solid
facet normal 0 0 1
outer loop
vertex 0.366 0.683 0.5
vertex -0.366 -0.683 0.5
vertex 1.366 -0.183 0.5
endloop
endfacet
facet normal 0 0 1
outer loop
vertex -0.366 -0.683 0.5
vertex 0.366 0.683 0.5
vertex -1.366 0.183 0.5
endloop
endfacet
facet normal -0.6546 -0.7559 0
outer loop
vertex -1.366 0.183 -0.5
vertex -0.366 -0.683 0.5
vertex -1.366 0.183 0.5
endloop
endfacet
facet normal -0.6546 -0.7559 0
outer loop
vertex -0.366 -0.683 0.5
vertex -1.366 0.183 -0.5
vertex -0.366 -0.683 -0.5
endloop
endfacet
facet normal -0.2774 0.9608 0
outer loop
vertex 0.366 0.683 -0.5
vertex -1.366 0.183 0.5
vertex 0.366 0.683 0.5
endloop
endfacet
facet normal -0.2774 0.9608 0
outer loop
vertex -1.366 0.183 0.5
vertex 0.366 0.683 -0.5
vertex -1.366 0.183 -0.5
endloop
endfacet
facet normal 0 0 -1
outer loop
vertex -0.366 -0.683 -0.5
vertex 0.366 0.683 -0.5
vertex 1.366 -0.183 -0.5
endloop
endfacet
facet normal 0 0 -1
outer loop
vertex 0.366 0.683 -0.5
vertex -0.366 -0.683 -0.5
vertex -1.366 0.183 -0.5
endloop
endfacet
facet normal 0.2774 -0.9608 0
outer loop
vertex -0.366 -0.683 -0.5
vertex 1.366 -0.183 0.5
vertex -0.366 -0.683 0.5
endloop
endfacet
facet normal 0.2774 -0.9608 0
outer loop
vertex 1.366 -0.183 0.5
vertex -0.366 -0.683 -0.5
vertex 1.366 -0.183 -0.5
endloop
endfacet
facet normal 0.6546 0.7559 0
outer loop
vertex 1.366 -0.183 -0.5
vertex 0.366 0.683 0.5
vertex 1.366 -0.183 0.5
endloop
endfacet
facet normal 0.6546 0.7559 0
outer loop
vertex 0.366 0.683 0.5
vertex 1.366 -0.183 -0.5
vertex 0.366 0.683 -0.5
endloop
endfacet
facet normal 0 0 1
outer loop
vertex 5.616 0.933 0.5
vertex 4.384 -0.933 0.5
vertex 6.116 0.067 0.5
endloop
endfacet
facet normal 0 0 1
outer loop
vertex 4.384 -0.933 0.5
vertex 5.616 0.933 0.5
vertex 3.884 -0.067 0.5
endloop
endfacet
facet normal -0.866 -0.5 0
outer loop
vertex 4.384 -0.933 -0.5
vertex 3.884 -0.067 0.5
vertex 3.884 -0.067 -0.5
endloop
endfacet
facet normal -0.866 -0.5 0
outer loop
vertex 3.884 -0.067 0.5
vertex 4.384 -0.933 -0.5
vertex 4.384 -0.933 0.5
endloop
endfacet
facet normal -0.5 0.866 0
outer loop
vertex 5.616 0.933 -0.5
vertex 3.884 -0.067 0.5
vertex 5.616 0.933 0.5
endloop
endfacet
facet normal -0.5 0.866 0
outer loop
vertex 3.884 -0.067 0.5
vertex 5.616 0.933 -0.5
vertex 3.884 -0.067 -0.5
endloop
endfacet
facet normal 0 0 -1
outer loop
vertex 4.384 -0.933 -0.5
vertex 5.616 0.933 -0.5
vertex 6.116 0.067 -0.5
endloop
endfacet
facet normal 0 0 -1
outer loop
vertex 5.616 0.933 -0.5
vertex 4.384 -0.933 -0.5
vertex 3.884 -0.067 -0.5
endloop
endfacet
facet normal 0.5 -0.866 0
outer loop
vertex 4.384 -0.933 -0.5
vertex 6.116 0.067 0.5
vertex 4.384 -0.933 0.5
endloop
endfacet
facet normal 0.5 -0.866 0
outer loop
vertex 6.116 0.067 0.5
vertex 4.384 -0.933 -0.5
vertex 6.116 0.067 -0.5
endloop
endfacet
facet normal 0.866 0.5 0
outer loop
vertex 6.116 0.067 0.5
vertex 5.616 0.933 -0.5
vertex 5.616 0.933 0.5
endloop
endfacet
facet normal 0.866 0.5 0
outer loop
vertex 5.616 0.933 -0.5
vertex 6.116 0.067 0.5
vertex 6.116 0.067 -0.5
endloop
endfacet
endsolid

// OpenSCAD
//------------------------------------------------------------------------------------------
// THIS CODE WAS GENERATED WITH GRAPHSCAD
//------------------------------------------------------------------------------------------
// E:/workspace/graphscad/graphscadfiles/objectvsworldscale.scad
//------------------------------------------------------------------------------------------
// Graphscad is a graphical nodal editor to create .SCAD files
//
// More info here : http://graphscad.free.fr
//
// Scad Files created with Graphscad can be edited by graphscad
// Scad Files created with Graphscad can be read by Openscad
//
//------------------------------------------------------------------------------------------
module objectvsworldscale()
{
 function node_cube_matrix(i=0,j=0,k=0,l=0,m=0,n=0) = translate([0.0,0,0]);
 module node_cube(i=0,j=0,k=0,l=0,m=0,n=0)
 {
  translate([0.0,0,0])cube([1,1,1],center=true);
 }
 function node_rotate_matrix(i=0,j=0,k=0,l=0,m=0,n=0) = rotate([0,0,30])*node_cube_matrix(i=i,j=j,k=k,l=l,m=m,n=n);
 module node_rotate(i=0,j=0,k=0,l=0,m=0,n=0)
 {
  rotate([0,0,30])node_cube(i,j,k,l,m,n);
 }
 function node_scale_matrix(i=0,j=0,k=0,l=0,m=0,n=0) = scale([2,1,1])*node_rotate_matrix(i=i,j=j,k=k,l=l,m=m,n=n);
 module node_scale(i=0,j=0,k=0,l=0,m=0,n=0)
 {
  scale([2,1,1])node_rotate(i,j,k,l,m,n);
 }
 function node_scale0_matrix(i=0,j=0,k=0,l=0,m=0,n=0) = node_rotate_matrix(i=i,j=j,k=k,l=l,m=m,n=n)*scale([2,1,1]);
 module node_scale0(i=0,j=0,k=0,l=0,m=0,n=0)
 {
  multmatrix(m=node_rotate_matrix(i=i,j=j,k=k,l=l,m=m,n=n)*scale([2,1,1])*inv4x4(node_rotate_matrix(i=i,j=j,k=k,l=l,m=m,n=n)))node_rotate(i,j,k,l,m,n);
 }
 function node_translate_matrix(i=0,j=0,k=0,l=0,m=0,n=0) = translate([5,0,0])*node_scale0_matrix(i=i,j=j,k=k,l=l,m=m,n=n);
 module node_translate(i=0,j=0,k=0,l=0,m=0,n=0)
 {
  translate([5,0,0])node_scale0(i,j,k,l,m,n);
 }
 node_scale();
 node_translate();
 /*--------------------------------------------------------------------------------------------------------
  Graphscad Utils functions
  This code is Used By Graphscad Nodal Editor to generate SCAD files
 --------------------------------------------------------------------------------------------------------*/
 function det4x4(a) =
 a[0][0]*a[1][1]*a[2][2]*a[3][3] + a[0][0]*a[1][2]*a[2][3]*a[3][1] + a[0][0]*a[1][3]*a[2][1]*a[3][2]
 + a[0][1]*a[1][0]*a[2][3]*a[3][2] + a[0][1]*a[1][2]*a[2][0]*a[3][3] + a[0][1]*a[1][3]*a[2][2]*a[3][0]
 + a[0][2]*a[1][0]*a[2][1]*a[3][3] + a[0][2]*a[1][1]*a[2][3]*a[3][0] + a[0][2]*a[1][3]*a[2][0]*a[3][1]
 + a[0][3]*a[1][0]*a[2][2]*a[3][1] + a[0][3]*a[1][1]*a[2][0]*a[3][2] + a[0][3]*a[1][2]*a[2][1]*a[3][0]
 - a[0][0]*a[1][1]*a[2][3]*a[3][2] - a[0][0]*a[1][2]*a[2][1]*a[3][3] - a[0][0]*a[1][3]*a[2][2]*a[3][1]
 - a[0][1]*a[1][0]*a[2][2]*a[3][3] - a[0][1]*a[1][2]*a[2][3]*a[3][0] - a[0][1]*a[1][3]*a[2][0]*a[3][2]
 - a[0][2]*a[1][0]*a[2][3]*a[3][1] - a[0][2]*a[1][1]*a[2][0]*a[3][3] - a[0][2]*a[1][3]*a[2][1]*a[3][0]
 - a[0][3]*a[1][0]*a[2][1]*a[3][2] - a[0][3]*a[1][1]*a[2][2]*a[3][0] - a[0][3]*a[1][2]*a[2][0]*a[3][1];
 function invb00(a) = a[1][1]*a[2][2]*a[3][3] + a[1][2]*a[2][3]*a[3][1] + a[1][3]*a[2][1]*a[3][2] - a[1][1]*a[2][3]*a[3][2] - a[1][2]*a[2][1]*a[3][3] - a[1][3]*a[2][2]*a[3][1];
 function invb01(a) = a[0][1]*a[2][3]*a[3][2] + a[0][2]*a[2][1]*a[3][3] + a[0][3]*a[2][2]*a[3][1] - a[0][1]*a[2][2]*a[3][3] - a[0][2]*a[2][3]*a[3][1] - a[0][3]*a[2][1]*a[3][2];
 function invb02(a) = a[0][1]*a[1][2]*a[3][3] + a[0][2]*a[1][3]*a[3][1] + a[0][3]*a[1][1]*a[3][2] - a[0][1]*a[1][3]*a[3][2] - a[0][2]*a[1][1]*a[3][3] - a[0][3]*a[1][2]*a[3][1];
 function invb03(a) = a[0][1]*a[1][3]*a[2][2] + a[0][2]*a[1][1]*a[2][3] + a[0][3]*a[1][2]*a[2][1] - a[0][1]*a[1][2]*a[2][3] - a[0][2]*a[1][3]*a[2][1] - a[0][3]*a[1][1]*a[2][2];
 function invb10(a) = a[1][0]*a[2][3]*a[3][2] + a[1][2]*a[2][0]*a[3][3] + a[1][3]*a[2][2]*a[3][0] - a[1][0]*a[2][2]*a[3][3] - a[1][2]*a[2][3]*a[3][0] - a[1][3]*a[2][0]*a[3][2];
 function invb11(a) = a[0][0]*a[2][2]*a[3][3] + a[0][2]*a[2][3]*a[3][0] + a[0][3]*a[2][0]*a[3][2] - a[0][0]*a[2][3]*a[3][2] - a[0][2]*a[2][0]*a[3][3] - a[0][3]*a[2][2]*a[3][0];
 function invb12(a) = a[0][0]*a[1][3]*a[3][2] + a[0][2]*a[1][0]*a[3][3] + a[0][3]*a[1][2]*a[3][0] - a[0][0]*a[1][2]*a[3][3] - a[0][2]*a[1][3]*a[3][0] - a[0][3]*a[1][0]*a[3][2];
 function invb13(a) = a[0][0]*a[1][2]*a[2][3] + a[0][2]*a[1][3]*a[2][0] + a[0][3]*a[1][0]*a[2][2] - a[0][0]*a[1][3]*a[2][2] - a[0][2]*a[1][0]*a[2][3] - a[0][3]*a[1][2]*a[2][0];
 function invb20(a) = a[1][0]*a[2][1]*a[3][3] + a[1][1]*a[2][3]*a[3][0] + a[1][3]*a[2][0]*a[3][1] - a[1][0]*a[2][3]*a[3][1] - a[1][1]*a[2][0]*a[3][3] - a[1][3]*a[2][1]*a[3][0];
 function invb21(a) = a[0][0]*a[2][3]*a[3][1] + a[0][1]*a[2][0]*a[3][3] + a[0][3]*a[2][1]*a[3][0] - a[0][0]*a[2][1]*a[3][3] - a[0][1]*a[2][3]*a[3][0] - a[0][3]*a[2][0]*a[3][1];
 function invb22(a) = a[0][0]*a[1][1]*a[3][3] + a[0][1]*a[1][3]*a[3][0] + a[0][3]*a[1][0]*a[3][1] - a[0][0]*a[1][3]*a[3][1] - a[0][1]*a[1][0]*a[3][3] - a[0][3]*a[1][1]*a[3][0];
 function invb23(a) = a[0][0]*a[1][3]*a[2][1] + a[0][1]*a[1][0]*a[2][3] + a[0][3]*a[1][1]*a[2][0] - a[0][0]*a[1][1]*a[2][3] - a[0][1]*a[1][3]*a[2][0] - a[0][3]*a[1][0]*a[2][1];
 function invb30(a) = a[1][0]*a[2][2]*a[3][1] + a[1][1]*a[2][0]*a[3][2] + a[1][2]*a[2][1]*a[3][0] - a[1][0]*a[2][1]*a[3][2] - a[1][1]*a[2][2]*a[3][0] - a[1][2]*a[2][0]*a[3][1];
 function invb31(a) = a[0][0]*a[2][1]*a[3][2] + a[0][1]*a[2][2]*a[3][0] + a[0][2]*a[2][0]*a[3][1] - a[0][0]*a[2][2]*a[3][1] - a[0][1]*a[2][0]*a[3][2] - a[0][2]*a[2][1]*a[3][0];
 function invb32(a) = a[0][0]*a[1][2]*a[3][1] + a[0][1]*a[1][0]*a[3][2] + a[0][2]*a[1][1]*a[3][0] - a[0][0]*a[1][1]*a[3][2] - a[0][1]*a[1][2]*a[3][0] - a[0][2]*a[1][0]*a[3][1];
 function invb33(a) = a[0][0]*a[1][1]*a[2][2] + a[0][1]*a[1][2]*a[2][0] + a[0][2]*a[1][0]*a[2][1] - a[0][0]*a[1][2]*a[2][1] - a[0][1]*a[1][0]*a[2][2] - a[0][2]*a[1][1]*a[2][0];
 function inv4x4(a)= (1/det4x4(a))*[
 [invb00(a),invb01(a),invb02(a),invb03(a)],
 [invb10(a),invb11(a),invb12(a),invb13(a)],
 [invb20(a),invb21(a),invb22(a),invb23(a)],
 [invb30(a),invb31(a),invb32(a),invb33(a)]];
 function onlytranslate(a)=  [
                        [1,0,0,a[0][3]],
                        [0,1,0,a[1][3]],
                        [0,0,1,a[2][3]],
                        [0,0,0,1]];
 function negonlytranslate(a)=[
                        [1,0,0,-a[0][3]],
                        [0,1,0,-a[1][3]],
                        [0,0,1,-a[2][3]],
                        [0,0,0,1]];
 function lookatvec(t,parentmat) = [t[0]-parentmat[0][3],
                                 t[1]-parentmat[1][3],
                                 t[2]-parentmat[2][3]];
 /*
              rx = '0'
              ry = 'acos('+tz+'/norm(['+tx+','+ty+','+tz+']))'
              rz = 'atan2('+ty+','+tx+')'
 */
 function lookatrot(t,parentmat) = [0,
                                 acos((t[2]-parentmat[2][3])/norm(lookatvec(t,parentmat))),
                                 atan2(t[1]-parentmat[1][3],t[0]-parentmat[0][3])];
 function gettranslation(m) = [m[0][3],m[1][3],m[2][3]];
 function vectormulmatrix(v,m) = m*v;
 function vectorlength(v) = norm(v);
 function vectorx(v) = v[0];
 function vectory(v) = v[1];
 function vectorz(v) = v[2];
 function vectoradd(a,b) = (a+b);
 function vectorsub(a,b) = (a-b);
 function vectormul(a,b) = (a*b);
 function vectordiv(a,b) = (a*(1/b));
 function scale(v)=[[v[0],0,0,0],
                    [0,v[1],0,0],
                    [0,0,v[2],0],
                    [0,0,0,1]];
 function rotatex(a)=[[1,0,0,0],
                      [0,cos(a),-sin(a),0],
                      [0,sin(a),cos(a),0],
                      [0,0,0,1]];
 function rotatey(a)=[[cos(a),0,sin(a),0],
                      [0,1,0,0],
                      [-sin(a),0,cos(a),0],
                      [0,0,0,1]];
 function rotatez(a)=[[cos(a),-sin(a),0,0],
                      [sin(a),cos(a),0,0],
                      [0,0,1,0],
                      [0,0,0,1]];
 function rotatea(c,s,l,m,n)=[[l*l*(1-c)+c,m*l*(1-c)-n*s,n*l*(1-c)+m*s,0],
                              [l*m*(1-c)+n*s,m*m*(1-c)+c,n*m*(1-c)-l*s,0],
                              [l*n*(1-c)-m*s,m*n*(1-c)+l*s,n*n*(1-c)+c,0],
                              [0,0,0,1]];
 function rotateanv(a,nv)=rotatea(cos(a),sin(a),nv[0],nv[1],nv[2]);
 function rotate(a,v, normV=true)=(v==undef)?rotatez(a[2])*rotatey(a[1])*rotatex(a[0]):
                      normV ? rotateanv(a,v/sqrt(v*v)) : rotateanv(a,v);
 function translate(v)=[[1,0,0,v[0]],
                        [0,1,0,v[1]],
                        [0,0,1,v[2]],
                        [0,0,0,1]];
 function mirrorabc(a,b,c)=[[1-2*a*a,-2*a*b,-2*a*c,0],
                            [-2*a*b,1-2*b*b,-2*b*c,0],
                            [-2*a*c,-2*b*c,1-2*c*c,0],
                            [0,0,0,1]];
 function mirrornv(nv)=mirrorabc(nv[0],nv[1],nv[2]);
 function mirror(v)=mirrornv(v/sqrt(v*v));
}
objectvsworldscale();


/*BEGINGRAPHSCAD{
    "nodes": [
        {
            "name": "node_cube",
            "inputplugs": [
                {
                    "tip": "x size of cube",
                    "type": "str",
                    "name": "sizex",
                    "value": "1"
                },
                {
                    "tip": "y size of cube",
                    "type": "str",
                    "name": "sizey",
                    "value": "1"
                },
                {
                    "tip": "z size of cube",
                    "type": "str",
                    "name": "sizez",
                    "value": "1"
                },
                {
                    "tip": "x translation of output object",
                    "type": "str",
                    "name": "tx",
                    "value": "0.0"
                },
                {
                    "tip": "y translation of output object",
                    "type": "str",
                    "name": "ty",
                    "value": "0"
                },
                {
                    "tip": "z translation of output object",
                    "type": "str",
                    "name": "tz",
                    "value": "0"
                },
                {
                    "tip": "centering of cube",
                    "type": "str",
                    "name": "center",
                    "value": "true",
                    "combo": [
                        "true",
                        "false"
                    ]
                }
            ],
            "typename": "Node_cube",
            "version": 1,
            "y": -37.89759999999997,
            "x": -3308.4511999999995
        },
        {
            "name": "node_rotate",
            "inputplugs": [
                {
                    "connection": "node_cube.object",
                    "type": "object",
                    "name": "object",
                    "value": ""
                },
                {
                    "type": "str",
                    "name": "rx",
                    "value": "0"
                },
                {
                    "type": "str",
                    "name": "ry",
                    "value": "0"
                },
                {
                    "type": "str",
                    "name": "rz",
                    "value": "30"
                },
                {
                    "type": "str",
                    "name": "space",
                    "value": "world",
                    "combo": [
                        "world",
                        "object",
                        "local"
                    ]
                }
            ],
            "typename": "Node_rotate",
            "version": 1,
            "y": -48.13759999999997,
            "x": -3094.0512000000003
        },
        {
            "name": "node_scale",
            "inputplugs": [
                {
                    "connection": "node_rotate.object",
                    "type": "object",
                    "name": "object",
                    "value": ""
                },
                {
                    "type": "str",
                    "name": "sx",
                    "value": "2"
                },
                {
                    "type": "str",
                    "name": "sy",
                    "value": "1"
                },
                {
                    "type": "str",
                    "name": "sz",
                    "value": "1"
                },
                {
                    "type": "str",
                    "name": "space",
                    "value": "world",
                    "combo": [
                        "world",
                        "object",
                        "local"
                    ]
                }
            ],
            "typename": "Node_scale",
            "version": 1,
            "y": -94.85759999999995,
            "x": -2823.971200000001
        },
        {
            "name": "node_scale0",
            "inputplugs": [
                {
                    "connection": "node_rotate.object",
                    "type": "object",
                    "name": "object",
                    "value": ""
                },
                {
                    "type": "str",
                    "name": "sx",
                    "value": "2"
                },
                {
                    "type": "str",
                    "name": "sy",
                    "value": "1"
                },
                {
                    "type": "str",
                    "name": "sz",
                    "value": "1"
                },
                {
                    "type": "str",
                    "name": "space",
                    "value": "object",
                    "combo": [
                        "world",
                        "object",
                        "local"
                    ]
                }
            ],
            "typename": "Node_scale",
            "version": 1,
            "y": 91.26240000000001,
            "x": -2821.131199999999
        },
        {
            "name": "node_translate",
            "inputplugs": [
                {
                    "connection": "node_scale0.object",
                    "type": "object",
                    "name": "object",
                    "value": ""
                },
                {
                    "type": "str",
                    "name": "tx",
                    "value": "5"
                },
                {
                    "type": "str",
                    "name": "ty",
                    "value": "0"
                },
                {
                    "type": "str",
                    "name": "tz",
                    "value": "0"
                },
                {
                    "type": "str",
                    "name": "space",
                    "value": "world",
                    "combo": [
                        "world",
                        "object",
                        "local"
                    ]
                }
            ],
            "typename": "Node_translate",
            "version": 1,
            "y": 92.26240000000001,
            "x": -2591.0112
        },
        {
            "name": "node_comment",
            "inputplugs": [
                {
                    "tip": "comment string to display on background",
                    "type": "str",
                    "name": "comment",
                    "value": "this show the different behaviour or scale when applied in world space and in object space.\nIn object space, the scale is applied as if the object was in center of world, with no rotation.\n "
                }
            ],
            "typename": "Node_comment",
            "version": 1,
            "y": -220.29850467289717,
            "x": -3301.4803115264795
        }
    ],
    "version": 2
}ENDGRAPHSCAD*/
